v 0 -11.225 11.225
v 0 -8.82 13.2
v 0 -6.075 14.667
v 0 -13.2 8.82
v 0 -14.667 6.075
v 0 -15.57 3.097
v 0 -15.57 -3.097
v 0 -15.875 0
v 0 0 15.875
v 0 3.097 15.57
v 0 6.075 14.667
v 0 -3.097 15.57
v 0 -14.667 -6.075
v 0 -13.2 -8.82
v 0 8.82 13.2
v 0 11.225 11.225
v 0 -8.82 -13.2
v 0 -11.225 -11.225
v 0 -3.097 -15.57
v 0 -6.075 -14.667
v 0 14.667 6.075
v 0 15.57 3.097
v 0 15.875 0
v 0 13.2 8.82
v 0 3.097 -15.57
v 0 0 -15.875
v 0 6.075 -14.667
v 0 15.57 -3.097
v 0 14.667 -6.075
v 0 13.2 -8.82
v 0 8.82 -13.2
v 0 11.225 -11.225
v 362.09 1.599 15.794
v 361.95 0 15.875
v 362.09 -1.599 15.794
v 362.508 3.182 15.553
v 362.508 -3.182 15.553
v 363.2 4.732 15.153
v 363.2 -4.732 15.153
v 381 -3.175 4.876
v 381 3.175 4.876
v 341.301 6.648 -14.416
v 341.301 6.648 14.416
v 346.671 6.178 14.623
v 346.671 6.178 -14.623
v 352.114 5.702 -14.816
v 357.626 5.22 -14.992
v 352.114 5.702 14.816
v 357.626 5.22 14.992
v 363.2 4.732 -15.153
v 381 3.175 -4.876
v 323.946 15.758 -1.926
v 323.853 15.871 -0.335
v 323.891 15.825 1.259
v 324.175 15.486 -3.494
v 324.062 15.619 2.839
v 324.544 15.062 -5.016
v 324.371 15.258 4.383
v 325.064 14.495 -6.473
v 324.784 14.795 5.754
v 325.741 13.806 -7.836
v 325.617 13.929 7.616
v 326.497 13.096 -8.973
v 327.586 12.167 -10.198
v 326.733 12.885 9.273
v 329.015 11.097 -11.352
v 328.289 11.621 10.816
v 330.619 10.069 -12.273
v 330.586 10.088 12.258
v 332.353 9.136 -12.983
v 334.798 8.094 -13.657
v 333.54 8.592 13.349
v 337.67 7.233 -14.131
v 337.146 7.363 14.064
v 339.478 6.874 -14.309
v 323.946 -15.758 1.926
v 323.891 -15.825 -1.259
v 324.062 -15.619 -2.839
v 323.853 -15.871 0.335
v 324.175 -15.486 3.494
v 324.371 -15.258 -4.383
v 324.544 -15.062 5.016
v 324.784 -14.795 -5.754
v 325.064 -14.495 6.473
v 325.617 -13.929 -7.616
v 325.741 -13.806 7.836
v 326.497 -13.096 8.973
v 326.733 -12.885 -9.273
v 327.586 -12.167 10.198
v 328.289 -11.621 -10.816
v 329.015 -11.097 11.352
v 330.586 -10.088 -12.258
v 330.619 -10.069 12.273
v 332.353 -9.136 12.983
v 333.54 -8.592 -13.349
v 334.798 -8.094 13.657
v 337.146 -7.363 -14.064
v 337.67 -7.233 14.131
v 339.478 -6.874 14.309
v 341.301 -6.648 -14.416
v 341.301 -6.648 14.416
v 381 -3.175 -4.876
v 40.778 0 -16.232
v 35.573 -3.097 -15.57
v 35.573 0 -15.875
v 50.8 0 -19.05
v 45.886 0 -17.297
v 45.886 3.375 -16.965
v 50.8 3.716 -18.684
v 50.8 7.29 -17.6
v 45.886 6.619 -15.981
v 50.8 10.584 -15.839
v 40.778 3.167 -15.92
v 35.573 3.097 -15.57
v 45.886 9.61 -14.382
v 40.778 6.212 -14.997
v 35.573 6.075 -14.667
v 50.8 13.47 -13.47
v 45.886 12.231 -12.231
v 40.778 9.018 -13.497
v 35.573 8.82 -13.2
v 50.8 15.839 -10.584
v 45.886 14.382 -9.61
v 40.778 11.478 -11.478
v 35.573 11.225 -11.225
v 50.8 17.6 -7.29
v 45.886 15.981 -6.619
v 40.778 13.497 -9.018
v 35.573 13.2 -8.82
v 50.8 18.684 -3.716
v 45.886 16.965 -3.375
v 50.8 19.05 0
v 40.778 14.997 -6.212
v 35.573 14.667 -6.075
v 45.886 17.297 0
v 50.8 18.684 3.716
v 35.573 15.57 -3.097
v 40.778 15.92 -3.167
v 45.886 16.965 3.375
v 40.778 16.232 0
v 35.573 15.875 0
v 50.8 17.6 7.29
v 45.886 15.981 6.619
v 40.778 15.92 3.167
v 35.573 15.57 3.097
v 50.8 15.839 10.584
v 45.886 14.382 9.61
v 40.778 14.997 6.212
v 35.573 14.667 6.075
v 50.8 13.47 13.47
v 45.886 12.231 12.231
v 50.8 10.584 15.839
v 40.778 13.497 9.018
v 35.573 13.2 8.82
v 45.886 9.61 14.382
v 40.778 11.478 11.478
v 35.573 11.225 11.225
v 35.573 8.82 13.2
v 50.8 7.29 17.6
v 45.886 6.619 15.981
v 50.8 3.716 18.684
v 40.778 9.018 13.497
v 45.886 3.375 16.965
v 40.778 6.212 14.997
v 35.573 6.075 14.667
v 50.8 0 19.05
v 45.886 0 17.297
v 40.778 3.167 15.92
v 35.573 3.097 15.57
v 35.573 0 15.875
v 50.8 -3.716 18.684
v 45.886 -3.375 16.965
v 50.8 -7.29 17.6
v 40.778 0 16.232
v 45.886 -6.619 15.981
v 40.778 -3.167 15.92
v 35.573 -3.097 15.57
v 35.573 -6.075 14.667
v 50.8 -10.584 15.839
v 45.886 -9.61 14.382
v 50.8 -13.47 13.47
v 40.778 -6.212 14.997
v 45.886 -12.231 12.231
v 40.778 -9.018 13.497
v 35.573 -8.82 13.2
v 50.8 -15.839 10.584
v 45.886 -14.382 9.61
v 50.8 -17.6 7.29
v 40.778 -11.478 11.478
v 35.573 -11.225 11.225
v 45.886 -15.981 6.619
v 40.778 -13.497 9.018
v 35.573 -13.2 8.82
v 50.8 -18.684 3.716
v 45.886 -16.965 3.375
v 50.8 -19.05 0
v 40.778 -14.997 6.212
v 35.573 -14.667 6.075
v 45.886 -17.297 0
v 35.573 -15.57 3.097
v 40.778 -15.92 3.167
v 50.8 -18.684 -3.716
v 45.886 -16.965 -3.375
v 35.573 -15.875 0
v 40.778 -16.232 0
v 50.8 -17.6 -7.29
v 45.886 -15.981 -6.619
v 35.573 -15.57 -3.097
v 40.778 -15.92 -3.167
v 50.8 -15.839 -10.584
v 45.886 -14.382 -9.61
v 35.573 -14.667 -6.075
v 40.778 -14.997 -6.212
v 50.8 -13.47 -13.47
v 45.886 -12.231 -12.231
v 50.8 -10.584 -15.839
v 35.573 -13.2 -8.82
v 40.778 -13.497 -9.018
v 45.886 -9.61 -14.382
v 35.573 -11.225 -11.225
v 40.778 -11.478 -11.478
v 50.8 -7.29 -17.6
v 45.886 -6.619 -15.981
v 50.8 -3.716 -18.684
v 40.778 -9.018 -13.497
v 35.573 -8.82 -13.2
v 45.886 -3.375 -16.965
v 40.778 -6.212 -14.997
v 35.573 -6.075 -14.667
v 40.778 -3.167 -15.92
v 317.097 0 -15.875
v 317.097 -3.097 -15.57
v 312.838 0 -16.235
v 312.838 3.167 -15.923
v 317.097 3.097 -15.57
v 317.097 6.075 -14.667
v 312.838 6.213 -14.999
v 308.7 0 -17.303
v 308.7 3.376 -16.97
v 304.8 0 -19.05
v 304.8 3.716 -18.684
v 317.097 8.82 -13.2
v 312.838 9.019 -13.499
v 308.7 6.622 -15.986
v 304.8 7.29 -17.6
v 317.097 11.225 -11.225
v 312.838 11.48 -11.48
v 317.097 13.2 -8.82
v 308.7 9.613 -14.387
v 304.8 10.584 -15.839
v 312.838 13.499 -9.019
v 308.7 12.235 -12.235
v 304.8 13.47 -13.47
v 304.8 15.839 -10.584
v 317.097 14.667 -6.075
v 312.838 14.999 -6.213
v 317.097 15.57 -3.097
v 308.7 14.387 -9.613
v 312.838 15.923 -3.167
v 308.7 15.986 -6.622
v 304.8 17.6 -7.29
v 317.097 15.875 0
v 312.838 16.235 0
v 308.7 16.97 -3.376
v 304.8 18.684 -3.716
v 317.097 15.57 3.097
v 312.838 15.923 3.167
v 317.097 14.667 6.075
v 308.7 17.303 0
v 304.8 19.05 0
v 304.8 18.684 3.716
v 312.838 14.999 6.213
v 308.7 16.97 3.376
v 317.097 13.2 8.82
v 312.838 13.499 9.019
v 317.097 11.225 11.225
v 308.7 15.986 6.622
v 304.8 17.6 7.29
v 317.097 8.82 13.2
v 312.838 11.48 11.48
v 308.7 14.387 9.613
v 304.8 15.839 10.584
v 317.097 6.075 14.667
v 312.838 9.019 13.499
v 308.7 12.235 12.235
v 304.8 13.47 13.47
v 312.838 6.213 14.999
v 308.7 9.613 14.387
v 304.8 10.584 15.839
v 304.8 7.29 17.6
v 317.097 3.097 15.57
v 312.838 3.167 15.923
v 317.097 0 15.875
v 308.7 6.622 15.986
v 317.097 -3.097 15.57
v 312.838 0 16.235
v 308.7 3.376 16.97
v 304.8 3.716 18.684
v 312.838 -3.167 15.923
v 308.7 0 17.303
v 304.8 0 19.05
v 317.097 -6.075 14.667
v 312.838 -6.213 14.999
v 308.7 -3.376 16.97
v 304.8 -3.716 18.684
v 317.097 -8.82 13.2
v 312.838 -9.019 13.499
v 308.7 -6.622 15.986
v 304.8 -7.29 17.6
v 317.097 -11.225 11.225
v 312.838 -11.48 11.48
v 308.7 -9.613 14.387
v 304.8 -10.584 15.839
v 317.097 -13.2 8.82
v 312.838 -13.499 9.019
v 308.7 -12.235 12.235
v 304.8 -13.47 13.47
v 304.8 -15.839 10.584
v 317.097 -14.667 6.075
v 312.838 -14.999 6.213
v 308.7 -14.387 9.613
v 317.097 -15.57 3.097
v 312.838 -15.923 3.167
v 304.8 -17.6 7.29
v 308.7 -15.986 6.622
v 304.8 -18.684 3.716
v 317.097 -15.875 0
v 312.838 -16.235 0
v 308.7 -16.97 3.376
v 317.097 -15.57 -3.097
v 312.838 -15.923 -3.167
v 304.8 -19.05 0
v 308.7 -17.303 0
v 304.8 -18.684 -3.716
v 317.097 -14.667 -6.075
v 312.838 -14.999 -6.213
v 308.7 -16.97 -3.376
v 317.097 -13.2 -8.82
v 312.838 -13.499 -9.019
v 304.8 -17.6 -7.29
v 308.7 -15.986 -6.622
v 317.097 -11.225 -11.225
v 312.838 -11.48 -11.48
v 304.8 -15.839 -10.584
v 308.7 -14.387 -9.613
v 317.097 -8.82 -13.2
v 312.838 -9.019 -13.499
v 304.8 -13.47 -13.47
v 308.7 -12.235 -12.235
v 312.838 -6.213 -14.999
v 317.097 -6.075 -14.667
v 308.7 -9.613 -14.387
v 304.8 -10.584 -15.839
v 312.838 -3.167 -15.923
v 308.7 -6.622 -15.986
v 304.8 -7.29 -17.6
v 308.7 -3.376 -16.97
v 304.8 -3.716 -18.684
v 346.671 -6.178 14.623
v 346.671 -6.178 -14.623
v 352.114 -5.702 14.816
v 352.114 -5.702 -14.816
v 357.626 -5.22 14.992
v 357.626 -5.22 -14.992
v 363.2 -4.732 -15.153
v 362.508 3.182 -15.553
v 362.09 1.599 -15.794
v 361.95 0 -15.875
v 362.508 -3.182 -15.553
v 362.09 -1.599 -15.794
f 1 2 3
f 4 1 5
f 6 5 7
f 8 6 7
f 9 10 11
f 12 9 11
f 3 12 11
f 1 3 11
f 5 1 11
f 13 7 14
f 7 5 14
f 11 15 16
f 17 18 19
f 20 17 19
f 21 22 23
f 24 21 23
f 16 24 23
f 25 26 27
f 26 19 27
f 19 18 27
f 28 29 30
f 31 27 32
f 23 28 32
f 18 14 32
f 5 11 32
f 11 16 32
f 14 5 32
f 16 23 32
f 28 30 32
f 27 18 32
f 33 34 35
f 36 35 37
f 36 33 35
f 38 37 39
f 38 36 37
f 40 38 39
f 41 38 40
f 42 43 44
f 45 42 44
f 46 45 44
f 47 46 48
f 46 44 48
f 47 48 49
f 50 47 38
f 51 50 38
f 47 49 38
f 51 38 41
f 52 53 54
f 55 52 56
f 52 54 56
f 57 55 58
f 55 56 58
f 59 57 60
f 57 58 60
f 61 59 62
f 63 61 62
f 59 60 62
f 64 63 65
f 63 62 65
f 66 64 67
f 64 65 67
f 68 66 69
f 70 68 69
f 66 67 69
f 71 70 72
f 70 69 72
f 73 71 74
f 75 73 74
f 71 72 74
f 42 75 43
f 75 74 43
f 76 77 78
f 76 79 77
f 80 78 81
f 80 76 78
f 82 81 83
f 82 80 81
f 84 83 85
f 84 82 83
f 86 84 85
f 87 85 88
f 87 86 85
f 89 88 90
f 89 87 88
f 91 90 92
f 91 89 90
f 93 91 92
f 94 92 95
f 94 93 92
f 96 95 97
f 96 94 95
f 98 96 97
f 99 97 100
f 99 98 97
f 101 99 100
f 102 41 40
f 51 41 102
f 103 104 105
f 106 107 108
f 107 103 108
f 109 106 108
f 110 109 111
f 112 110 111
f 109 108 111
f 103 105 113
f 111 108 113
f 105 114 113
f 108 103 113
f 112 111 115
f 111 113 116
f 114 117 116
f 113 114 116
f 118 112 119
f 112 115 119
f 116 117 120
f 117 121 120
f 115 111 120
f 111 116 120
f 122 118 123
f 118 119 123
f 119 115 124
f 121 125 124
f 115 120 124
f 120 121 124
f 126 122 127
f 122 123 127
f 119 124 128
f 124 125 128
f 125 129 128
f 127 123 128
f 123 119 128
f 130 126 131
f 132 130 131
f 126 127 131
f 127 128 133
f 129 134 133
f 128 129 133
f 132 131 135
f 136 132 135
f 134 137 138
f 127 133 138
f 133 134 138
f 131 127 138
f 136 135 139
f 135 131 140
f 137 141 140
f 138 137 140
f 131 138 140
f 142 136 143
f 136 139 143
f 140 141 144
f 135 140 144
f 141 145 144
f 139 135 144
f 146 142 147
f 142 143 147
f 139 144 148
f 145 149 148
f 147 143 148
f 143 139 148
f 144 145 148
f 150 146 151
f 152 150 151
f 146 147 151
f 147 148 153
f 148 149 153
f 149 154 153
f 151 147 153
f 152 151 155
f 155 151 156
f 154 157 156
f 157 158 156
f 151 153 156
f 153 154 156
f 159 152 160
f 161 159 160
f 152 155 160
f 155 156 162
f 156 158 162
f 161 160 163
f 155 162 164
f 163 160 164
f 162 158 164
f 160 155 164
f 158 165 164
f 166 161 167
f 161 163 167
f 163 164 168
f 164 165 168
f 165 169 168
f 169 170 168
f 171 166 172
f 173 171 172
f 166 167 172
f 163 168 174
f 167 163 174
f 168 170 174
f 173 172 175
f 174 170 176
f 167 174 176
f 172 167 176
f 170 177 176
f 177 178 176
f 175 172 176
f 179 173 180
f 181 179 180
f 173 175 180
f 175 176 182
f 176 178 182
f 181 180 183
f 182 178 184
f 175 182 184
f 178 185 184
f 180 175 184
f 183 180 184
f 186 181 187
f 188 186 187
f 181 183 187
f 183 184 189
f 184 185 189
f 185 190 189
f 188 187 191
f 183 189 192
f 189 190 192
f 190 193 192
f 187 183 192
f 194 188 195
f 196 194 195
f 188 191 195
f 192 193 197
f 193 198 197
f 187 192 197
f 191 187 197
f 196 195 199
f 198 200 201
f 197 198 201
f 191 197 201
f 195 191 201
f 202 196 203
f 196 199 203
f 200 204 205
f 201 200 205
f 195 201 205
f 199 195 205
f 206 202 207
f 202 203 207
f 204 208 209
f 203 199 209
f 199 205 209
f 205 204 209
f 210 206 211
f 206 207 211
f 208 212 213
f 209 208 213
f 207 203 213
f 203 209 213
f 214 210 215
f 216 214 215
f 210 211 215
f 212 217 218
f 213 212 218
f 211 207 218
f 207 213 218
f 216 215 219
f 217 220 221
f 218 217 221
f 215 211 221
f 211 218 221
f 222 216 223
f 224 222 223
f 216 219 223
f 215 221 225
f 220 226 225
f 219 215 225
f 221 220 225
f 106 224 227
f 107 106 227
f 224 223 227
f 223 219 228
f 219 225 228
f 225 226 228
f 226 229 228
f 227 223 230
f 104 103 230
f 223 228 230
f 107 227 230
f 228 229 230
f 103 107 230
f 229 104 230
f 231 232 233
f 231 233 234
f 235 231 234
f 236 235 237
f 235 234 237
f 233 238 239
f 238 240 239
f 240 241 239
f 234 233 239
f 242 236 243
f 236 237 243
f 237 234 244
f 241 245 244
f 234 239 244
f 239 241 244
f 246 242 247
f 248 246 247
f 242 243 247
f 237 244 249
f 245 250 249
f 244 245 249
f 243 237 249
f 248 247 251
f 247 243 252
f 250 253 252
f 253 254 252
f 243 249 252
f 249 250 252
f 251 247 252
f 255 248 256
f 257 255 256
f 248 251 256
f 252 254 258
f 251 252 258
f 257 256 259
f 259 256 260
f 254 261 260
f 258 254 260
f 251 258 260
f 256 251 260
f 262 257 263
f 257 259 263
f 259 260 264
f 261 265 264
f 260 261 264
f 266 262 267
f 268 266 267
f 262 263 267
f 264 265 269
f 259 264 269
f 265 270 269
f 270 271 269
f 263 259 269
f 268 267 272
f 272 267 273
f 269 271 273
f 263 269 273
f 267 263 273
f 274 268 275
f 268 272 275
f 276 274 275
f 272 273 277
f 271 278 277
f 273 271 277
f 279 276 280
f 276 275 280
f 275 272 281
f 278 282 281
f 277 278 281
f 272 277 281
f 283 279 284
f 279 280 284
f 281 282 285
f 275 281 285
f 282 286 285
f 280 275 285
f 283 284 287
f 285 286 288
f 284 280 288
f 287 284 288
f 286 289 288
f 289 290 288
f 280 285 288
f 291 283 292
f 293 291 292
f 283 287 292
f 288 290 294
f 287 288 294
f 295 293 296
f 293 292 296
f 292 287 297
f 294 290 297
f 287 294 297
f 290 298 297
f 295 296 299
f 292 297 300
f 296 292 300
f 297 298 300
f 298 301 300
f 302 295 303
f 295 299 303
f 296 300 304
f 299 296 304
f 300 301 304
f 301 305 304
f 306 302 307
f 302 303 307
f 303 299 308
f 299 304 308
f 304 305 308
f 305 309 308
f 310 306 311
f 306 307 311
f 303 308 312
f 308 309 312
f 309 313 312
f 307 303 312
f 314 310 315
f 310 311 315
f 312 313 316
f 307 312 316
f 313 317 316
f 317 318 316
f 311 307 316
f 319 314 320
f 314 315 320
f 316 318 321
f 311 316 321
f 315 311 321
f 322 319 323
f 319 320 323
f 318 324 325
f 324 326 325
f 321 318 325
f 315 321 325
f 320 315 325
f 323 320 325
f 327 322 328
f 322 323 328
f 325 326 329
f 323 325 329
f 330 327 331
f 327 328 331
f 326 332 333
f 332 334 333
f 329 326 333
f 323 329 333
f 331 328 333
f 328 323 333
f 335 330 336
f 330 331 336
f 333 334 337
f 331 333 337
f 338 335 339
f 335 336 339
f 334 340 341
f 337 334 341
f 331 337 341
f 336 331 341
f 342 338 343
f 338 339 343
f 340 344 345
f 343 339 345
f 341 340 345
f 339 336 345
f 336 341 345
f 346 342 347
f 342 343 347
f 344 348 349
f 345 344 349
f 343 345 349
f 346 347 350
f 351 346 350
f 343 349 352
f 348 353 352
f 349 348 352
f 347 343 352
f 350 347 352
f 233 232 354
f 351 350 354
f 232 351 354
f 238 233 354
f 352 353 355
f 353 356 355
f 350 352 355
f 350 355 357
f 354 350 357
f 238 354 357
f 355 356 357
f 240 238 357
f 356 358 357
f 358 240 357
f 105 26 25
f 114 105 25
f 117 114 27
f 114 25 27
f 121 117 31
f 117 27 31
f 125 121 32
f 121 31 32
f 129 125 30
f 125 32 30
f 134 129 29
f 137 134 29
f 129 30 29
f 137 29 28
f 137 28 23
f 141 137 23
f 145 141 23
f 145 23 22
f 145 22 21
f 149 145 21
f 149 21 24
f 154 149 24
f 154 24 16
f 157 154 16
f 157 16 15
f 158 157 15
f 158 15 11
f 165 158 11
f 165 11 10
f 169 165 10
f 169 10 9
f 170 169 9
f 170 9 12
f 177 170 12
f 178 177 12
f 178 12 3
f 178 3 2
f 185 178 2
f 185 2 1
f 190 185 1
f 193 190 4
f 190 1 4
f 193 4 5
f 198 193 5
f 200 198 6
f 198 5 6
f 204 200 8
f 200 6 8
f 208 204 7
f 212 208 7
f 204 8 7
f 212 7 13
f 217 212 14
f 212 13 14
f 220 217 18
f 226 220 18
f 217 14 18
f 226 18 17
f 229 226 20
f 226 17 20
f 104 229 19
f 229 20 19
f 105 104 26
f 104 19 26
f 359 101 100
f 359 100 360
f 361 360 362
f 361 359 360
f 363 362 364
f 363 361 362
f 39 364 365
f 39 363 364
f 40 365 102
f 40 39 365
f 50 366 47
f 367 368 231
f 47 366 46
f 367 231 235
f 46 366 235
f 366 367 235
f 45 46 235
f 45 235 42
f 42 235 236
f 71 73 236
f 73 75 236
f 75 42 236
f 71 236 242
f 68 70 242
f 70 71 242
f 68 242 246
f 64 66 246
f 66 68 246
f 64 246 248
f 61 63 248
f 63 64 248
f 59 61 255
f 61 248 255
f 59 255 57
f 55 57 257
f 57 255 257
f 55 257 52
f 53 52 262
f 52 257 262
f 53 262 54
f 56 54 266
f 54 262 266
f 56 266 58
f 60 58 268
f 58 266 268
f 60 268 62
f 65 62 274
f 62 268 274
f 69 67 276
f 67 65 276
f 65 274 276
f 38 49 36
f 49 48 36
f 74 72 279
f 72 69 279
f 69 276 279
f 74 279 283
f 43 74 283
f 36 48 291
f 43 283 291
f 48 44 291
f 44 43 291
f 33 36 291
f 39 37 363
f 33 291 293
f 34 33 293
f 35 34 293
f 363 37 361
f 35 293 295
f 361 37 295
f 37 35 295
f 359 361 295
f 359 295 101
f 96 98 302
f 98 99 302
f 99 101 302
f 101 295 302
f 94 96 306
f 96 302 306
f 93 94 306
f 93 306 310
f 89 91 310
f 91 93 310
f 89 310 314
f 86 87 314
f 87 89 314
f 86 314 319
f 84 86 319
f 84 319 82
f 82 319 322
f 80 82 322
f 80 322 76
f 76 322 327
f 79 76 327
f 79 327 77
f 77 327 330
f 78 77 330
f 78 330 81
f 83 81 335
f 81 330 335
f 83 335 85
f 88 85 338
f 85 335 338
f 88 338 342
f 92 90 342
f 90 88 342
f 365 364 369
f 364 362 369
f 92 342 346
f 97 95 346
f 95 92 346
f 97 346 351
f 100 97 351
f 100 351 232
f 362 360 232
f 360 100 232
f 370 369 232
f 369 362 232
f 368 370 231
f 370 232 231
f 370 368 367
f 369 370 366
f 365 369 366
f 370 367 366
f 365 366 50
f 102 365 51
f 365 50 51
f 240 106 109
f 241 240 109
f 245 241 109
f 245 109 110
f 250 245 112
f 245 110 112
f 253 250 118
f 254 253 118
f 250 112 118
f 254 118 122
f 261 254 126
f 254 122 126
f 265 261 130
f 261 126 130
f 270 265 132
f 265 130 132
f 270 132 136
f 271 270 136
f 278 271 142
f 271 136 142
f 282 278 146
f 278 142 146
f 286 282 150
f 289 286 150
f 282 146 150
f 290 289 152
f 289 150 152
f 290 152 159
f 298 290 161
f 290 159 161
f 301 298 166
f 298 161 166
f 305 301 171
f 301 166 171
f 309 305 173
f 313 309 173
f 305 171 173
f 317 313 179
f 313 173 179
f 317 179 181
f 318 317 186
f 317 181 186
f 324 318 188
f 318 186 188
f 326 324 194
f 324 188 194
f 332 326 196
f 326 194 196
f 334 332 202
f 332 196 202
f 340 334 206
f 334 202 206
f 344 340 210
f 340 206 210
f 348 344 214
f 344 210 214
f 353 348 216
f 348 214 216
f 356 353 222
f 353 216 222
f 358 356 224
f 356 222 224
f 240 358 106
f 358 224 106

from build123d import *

# Parameters (mm, degrees)
SKETCH1_R           = 15.875
BASE_EXTRUDE_DEPTH  = 50.8
SKETCH2_R           = 19.05
BOSS_EXTRUDE1_DEPTH = 254
SKETCH3_R           = 15.875
BOSS_EXTRUDE2_DEPTH = 76.2
FILLET1_R           = 25.4
FILLET2_R           = 38.1
CUT_EXTRUDE1_DEPTH  = 38.1
CUT_EXTRUDE2_DEPTH  = 38.1


with BuildPart() as part:
    # Sketch1 → Base-Extrude (new body)
    with BuildSketch(Plane(origin=(0, 0, 0), x_dir=(0, 0, -1), z_dir=(1, 0, 0))):
        Circle(SKETCH1_R)
    extrude(amount=BASE_EXTRUDE_DEPTH)

    # Sketch2 → Boss-Extrude1 (add)
    with BuildSketch(Plane(origin=(50.8, 0, 0), x_dir=(0, 0, -1), z_dir=(1, 0, 0))):
        Circle(SKETCH2_R)
    extrude(amount=BOSS_EXTRUDE1_DEPTH)

    # Sketch3 → Boss-Extrude2 (add)
    with BuildSketch(Plane(origin=(304.8, 0, 0), x_dir=(0, 0, -1), z_dir=(1, 0, 0))):
        Circle(SKETCH3_R)
    extrude(amount=BOSS_EXTRUDE2_DEPTH)

    # Fillet1
    # the kernel refuses this fillet: 25.4 mm, written as the material it adds along each edge
    with BuildSketch(Plane(origin=(304.8, 0, 0), x_dir=(0, 0, -1), z_dir=(0, -1, 0))) as fillet1_piece_1:
        with BuildLine():
            CenterArc((41.275, 12.296722124), FILLET1_R, 180, 28.955024372)
            Line((15.875, 12.296722124), (15.367, 12.296722124))
            Line((15.367, 12.296722124), (15.367, 0))
            Line((15.367, 0), (15.875, -0.508))
            ThreePointArc((15.875, -0.508), (17.4625, -0.508), (18.6055, -0.245934442))
            Line((18.6055, -0.245934442), (19.05, 0))
        make_face()
    revolve(axis=Axis((304.8, 0, 0), (1, 0, 0)))

    # Fillet2
    # the kernel refuses this fillet: 38.1 mm, written as the material it adds along each edge
    with BuildSketch(Plane(origin=(50.8, 0, 0), x_dir=(0, 0, -1), z_dir=(0, -1, 0))) as fillet2_piece_1:
        with BuildLine():
            CenterArc((53.975, -15.226765087), FILLET2_R, 156.443535691, 23.556464309)
            Line((15.875, -15.226765087), (15.113, -15.226765087))
            Line((15.113, -15.226765087), (15.113, 0))
            Line((15.113, 0), (15.875, 0.762))
            ThreePointArc((15.875, 0.762), (17.4625, 0.762), (18.3515, 0.304535302))
            Line((18.3515, 0.304535302), (19.05, 0))
        make_face()
    revolve(axis=Axis((50.8, 0, 0), (1, 0, 0)))

    # Sketch4 → Cut-Extrude1 (cut, symmetric)
    with BuildSketch(Plane.XY):
        with BuildLine():
            Line((341.301045638, 6.648208461), (381, 3.175))
            Line((381, 3.175), (381, 15.875))
            Line((381, 15.875), (323.85, 15.875))
            ThreePointArc((323.85, 15.875), (331.642512816, 9.496960468), (341.301045638, 6.648208461))
        make_face()
    cut_extrude1 = extrude(amount=CUT_EXTRUDE1_DEPTH, both=True, mode=Mode.SUBTRACT)

    # Mirror1: Cut-Extrude1 across plane
    add(cut_extrude1.mirror(Plane.ZX), mode=Mode.SUBTRACT)

    # Sketch5 → Cut-Extrude2 (cut, symmetric)
    with BuildSketch(Plane(origin=(0, 0, 0), x_dir=(1, 0, 0), z_dir=(0, 1, 0))):
        Polygon((361.95, 15.875), (381, 4.876477372), (381, 15.875), align=None)
    cut_extrude2 = extrude(amount=CUT_EXTRUDE2_DEPTH, both=True, mode=Mode.SUBTRACT)

    # Mirror2: Cut-Extrude2 across plane
    add(cut_extrude2.mirror(Plane.XY), mode=Mode.SUBTRACT)


solid = part.part
